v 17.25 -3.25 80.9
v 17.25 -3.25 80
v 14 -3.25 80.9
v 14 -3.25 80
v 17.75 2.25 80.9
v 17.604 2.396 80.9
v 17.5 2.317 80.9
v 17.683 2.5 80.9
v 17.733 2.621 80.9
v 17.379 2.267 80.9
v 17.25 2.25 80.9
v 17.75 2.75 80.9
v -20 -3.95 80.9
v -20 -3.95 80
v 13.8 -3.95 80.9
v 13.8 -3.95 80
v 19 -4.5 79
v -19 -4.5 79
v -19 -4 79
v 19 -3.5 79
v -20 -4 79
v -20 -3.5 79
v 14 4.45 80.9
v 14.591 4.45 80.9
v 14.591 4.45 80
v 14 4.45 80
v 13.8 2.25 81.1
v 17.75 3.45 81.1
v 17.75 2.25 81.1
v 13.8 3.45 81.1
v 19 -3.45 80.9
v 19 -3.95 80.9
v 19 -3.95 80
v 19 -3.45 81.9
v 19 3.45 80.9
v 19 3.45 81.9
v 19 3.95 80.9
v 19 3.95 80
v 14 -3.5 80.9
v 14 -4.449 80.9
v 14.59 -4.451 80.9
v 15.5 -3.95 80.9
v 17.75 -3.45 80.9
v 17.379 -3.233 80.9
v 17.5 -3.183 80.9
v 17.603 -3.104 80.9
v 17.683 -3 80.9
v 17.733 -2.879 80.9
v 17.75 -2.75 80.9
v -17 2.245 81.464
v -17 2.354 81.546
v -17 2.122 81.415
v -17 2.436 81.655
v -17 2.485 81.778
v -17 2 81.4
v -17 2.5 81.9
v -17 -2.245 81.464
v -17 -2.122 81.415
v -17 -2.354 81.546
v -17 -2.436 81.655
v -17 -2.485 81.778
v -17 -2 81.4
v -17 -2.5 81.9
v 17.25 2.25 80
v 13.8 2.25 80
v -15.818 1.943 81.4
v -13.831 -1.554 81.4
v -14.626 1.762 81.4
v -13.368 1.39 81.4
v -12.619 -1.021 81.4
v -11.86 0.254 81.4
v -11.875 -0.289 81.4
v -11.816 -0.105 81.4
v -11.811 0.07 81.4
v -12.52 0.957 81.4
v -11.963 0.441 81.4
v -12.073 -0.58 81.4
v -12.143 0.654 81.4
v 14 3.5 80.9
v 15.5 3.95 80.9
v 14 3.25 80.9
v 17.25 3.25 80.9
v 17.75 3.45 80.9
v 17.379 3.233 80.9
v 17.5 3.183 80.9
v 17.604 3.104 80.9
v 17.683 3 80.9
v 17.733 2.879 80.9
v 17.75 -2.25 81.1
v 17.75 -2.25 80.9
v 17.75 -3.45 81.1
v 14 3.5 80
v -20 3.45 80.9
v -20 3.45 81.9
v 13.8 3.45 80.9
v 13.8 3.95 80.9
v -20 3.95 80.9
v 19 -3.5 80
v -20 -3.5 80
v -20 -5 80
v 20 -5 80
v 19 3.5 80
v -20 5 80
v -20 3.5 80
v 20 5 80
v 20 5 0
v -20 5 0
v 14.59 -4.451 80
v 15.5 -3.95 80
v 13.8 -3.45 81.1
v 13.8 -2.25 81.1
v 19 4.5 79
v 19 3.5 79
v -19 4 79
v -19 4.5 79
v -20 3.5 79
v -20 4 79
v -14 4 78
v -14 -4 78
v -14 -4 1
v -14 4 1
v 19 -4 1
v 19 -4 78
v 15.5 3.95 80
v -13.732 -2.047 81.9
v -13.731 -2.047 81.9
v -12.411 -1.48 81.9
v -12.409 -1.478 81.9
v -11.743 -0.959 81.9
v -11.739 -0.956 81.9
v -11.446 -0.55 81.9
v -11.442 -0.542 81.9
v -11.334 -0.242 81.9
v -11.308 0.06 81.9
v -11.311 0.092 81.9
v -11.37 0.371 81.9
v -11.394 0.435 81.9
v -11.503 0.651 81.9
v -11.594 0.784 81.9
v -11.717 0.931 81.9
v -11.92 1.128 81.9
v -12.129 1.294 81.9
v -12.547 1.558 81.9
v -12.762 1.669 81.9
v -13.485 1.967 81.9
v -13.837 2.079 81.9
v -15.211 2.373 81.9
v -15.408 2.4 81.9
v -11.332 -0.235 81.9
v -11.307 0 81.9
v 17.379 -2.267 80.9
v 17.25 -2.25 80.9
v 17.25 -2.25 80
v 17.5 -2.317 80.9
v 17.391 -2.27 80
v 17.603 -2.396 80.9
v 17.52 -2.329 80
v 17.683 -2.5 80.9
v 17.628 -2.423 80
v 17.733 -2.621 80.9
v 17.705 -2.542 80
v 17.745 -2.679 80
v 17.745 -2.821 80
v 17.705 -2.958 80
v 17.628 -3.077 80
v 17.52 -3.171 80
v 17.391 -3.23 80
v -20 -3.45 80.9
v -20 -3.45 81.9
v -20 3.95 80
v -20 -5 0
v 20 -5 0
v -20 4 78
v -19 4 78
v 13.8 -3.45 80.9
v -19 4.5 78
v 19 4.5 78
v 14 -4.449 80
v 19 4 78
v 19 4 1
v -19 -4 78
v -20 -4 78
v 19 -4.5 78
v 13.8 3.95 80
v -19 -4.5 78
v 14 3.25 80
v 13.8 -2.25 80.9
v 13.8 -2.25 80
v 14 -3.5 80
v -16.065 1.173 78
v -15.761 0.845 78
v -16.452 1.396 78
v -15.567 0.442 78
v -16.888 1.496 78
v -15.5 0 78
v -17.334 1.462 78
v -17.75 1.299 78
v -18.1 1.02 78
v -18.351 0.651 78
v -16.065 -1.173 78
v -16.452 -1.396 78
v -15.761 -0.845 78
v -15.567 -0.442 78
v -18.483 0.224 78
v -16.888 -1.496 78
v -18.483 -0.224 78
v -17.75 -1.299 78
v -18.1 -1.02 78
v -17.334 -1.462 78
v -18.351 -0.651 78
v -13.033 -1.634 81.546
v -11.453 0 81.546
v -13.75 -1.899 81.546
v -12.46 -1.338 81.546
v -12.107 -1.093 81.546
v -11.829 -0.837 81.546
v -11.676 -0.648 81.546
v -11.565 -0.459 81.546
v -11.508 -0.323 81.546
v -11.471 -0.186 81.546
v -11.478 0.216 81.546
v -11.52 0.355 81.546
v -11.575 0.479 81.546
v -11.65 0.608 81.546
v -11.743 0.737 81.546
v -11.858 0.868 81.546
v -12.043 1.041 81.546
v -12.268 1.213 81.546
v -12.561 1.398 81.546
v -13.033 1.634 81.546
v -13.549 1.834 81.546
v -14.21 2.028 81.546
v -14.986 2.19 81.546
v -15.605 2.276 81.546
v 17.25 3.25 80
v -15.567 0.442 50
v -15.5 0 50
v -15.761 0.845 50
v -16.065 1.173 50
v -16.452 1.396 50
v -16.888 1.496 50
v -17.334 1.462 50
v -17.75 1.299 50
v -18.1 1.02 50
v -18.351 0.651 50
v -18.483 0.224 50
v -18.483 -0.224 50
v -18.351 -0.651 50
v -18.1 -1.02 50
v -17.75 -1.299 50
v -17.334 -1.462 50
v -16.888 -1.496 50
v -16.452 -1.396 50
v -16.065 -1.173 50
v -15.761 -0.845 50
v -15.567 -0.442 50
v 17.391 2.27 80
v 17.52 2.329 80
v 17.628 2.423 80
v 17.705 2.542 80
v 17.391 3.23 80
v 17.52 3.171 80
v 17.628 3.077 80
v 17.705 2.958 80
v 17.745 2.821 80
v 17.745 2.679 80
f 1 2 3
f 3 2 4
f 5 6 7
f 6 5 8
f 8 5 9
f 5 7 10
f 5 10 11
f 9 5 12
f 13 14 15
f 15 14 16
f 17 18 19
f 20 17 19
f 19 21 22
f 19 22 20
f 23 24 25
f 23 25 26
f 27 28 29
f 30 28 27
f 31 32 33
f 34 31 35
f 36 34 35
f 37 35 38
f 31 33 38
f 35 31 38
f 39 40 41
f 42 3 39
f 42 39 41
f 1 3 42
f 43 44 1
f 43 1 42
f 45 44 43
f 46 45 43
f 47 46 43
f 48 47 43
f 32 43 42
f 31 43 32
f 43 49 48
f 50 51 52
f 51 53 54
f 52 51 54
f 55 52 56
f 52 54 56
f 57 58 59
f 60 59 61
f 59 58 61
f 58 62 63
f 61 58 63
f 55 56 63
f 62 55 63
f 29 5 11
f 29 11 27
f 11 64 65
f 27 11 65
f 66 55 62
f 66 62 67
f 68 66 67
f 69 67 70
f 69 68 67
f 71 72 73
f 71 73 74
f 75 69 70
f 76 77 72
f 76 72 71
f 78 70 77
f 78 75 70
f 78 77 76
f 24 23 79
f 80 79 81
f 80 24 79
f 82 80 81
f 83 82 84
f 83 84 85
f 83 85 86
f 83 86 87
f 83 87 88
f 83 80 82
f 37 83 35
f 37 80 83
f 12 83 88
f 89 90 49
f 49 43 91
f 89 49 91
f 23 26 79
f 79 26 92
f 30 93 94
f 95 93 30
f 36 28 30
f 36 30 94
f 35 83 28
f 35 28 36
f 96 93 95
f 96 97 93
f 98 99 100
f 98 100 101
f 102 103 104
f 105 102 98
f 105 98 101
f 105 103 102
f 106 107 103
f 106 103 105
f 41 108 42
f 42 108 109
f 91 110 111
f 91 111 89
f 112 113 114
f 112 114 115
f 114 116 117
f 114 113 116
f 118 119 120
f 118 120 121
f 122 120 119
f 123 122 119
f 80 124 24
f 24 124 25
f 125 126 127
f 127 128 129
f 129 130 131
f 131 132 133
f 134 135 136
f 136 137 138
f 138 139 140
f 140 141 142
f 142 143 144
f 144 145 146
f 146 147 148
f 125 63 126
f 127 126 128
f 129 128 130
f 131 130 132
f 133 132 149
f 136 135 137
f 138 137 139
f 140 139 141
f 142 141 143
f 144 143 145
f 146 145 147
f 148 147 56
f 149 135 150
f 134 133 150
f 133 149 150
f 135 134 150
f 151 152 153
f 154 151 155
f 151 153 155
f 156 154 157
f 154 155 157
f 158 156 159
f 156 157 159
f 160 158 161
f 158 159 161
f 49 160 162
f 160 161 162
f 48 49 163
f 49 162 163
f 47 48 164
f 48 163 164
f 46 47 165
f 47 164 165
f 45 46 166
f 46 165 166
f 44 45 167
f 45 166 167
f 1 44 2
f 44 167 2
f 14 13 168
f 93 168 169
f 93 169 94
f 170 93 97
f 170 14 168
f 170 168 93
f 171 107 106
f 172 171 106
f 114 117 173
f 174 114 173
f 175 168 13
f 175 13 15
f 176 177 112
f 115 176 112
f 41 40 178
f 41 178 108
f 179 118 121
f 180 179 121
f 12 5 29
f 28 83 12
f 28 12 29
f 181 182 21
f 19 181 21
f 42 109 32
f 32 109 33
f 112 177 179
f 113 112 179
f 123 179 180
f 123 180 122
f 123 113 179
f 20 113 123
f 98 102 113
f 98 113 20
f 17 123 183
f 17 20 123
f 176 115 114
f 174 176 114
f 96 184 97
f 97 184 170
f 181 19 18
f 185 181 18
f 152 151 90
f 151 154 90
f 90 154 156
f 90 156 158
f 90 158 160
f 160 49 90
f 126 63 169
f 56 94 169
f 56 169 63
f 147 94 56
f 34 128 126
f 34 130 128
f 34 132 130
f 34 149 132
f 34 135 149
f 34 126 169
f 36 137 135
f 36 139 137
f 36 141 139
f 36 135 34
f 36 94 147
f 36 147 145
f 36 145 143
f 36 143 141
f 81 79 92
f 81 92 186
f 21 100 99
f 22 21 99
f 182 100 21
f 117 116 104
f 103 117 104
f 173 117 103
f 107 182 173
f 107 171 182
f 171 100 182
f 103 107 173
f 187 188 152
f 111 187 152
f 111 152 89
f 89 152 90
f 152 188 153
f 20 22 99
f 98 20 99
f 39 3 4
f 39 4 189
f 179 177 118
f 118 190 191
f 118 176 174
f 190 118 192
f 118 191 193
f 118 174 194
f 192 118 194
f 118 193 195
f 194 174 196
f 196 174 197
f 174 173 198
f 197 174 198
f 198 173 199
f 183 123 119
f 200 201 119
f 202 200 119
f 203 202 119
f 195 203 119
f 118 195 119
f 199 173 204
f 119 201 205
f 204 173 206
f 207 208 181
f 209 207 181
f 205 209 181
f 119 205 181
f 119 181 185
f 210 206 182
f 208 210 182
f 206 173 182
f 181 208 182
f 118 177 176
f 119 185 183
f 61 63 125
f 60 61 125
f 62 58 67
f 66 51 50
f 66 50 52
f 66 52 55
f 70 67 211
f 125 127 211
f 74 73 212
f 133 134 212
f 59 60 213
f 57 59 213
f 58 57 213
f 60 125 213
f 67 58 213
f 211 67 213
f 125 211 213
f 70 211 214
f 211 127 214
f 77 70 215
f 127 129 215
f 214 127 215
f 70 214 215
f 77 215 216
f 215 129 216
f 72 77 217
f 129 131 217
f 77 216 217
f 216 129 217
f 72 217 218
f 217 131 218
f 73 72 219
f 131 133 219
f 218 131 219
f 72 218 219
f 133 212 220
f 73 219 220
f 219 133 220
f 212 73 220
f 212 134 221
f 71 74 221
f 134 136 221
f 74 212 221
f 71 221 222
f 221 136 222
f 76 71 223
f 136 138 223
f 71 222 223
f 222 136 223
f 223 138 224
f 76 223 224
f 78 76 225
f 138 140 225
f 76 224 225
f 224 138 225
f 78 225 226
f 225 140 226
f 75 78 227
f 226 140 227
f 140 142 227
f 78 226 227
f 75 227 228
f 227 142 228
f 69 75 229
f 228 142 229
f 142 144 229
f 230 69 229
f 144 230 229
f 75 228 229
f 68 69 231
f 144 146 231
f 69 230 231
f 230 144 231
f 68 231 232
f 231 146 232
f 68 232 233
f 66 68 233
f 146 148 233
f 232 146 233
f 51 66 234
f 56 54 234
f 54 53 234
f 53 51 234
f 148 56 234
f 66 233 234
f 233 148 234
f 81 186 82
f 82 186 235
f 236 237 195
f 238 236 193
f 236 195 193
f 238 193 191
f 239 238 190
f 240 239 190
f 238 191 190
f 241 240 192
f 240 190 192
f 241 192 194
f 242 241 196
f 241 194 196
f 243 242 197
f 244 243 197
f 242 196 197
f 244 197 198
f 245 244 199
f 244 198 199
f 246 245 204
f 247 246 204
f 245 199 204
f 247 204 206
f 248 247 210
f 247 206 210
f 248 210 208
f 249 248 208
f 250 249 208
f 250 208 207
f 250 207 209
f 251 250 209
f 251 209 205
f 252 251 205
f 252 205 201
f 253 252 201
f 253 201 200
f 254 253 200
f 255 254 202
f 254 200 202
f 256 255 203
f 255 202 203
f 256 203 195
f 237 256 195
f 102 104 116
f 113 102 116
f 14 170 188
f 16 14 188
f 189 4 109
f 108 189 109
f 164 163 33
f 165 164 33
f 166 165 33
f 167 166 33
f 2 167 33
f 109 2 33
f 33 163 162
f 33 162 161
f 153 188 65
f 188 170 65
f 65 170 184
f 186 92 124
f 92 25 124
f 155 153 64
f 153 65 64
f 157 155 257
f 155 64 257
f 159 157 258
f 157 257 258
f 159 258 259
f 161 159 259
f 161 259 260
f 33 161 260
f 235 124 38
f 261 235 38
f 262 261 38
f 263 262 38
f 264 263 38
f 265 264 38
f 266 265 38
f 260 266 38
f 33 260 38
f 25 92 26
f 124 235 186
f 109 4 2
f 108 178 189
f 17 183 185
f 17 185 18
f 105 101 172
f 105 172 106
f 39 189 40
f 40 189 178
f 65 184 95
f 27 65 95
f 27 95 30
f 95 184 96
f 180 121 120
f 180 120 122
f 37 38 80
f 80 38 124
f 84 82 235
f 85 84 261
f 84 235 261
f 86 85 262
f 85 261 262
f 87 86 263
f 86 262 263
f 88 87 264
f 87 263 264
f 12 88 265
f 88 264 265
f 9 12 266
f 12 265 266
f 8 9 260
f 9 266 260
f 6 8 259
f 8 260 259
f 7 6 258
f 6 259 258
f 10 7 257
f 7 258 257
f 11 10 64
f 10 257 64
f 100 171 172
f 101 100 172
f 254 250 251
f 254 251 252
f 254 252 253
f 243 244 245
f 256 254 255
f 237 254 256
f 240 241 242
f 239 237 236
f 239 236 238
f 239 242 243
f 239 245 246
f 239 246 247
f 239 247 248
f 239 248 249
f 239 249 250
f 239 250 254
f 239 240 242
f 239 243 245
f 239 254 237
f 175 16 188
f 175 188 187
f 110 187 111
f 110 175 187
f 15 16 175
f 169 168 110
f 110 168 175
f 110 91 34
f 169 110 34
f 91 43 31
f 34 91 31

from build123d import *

# Parameters (mm, degrees)
F0_W      = 40
F0_H      = 10
F1_DEPTH  = 80
F3_START  = -2
F2_W      = 33
F2_H      = 8
F3_DEPTH  = 77
F5_START  = -2
F4_R      = 1.5
F5_DEPTH  = 28
F7_DEPTH  = 39
F9_START  = -1
F8_W      = 0.5
F8_H      = 1
F9_DEPTH  = 38
F11_DEPTH = 0.9
F12_W     = 39
F12_H     = 6.9
F13_DEPTH = 1
F14_W     = 3.9498324515
F14_H     = 0.2
F15_DEPTH = 1.2
F16_W     = 3.95
F16_H     = 0.2
F17_DEPTH = 1.2
F19_DEPTH = 0.5
F20_R     = 0.49999


# Not quite as in the source:
# - a fillet or chamfer is up to 0.001 mm smaller than in the source, because OpenCascade refuses the exact size


with BuildPart() as f1:
    # F0 (on Top) → F1 (new body)
    with BuildSketch(Plane.XY):
        Rectangle(F0_W, F0_H)
    extrude(amount=F1_DEPTH)

    # F2 (on face) → F3 (cut)
    with BuildSketch(Plane.XY.offset(80).offset(F3_START)):
        with Locations((2.5, 0)):
            Rectangle(F2_W, F2_H)
    extrude(amount=-F3_DEPTH, mode=Mode.SUBTRACT)

    # F4 (on face) → F5 (cut)
    with BuildSketch(Plane.XY.offset(80).offset(F5_START)):
        with Locations((-17, 0)):
            Circle(F4_R)
    extrude(amount=-F5_DEPTH, mode=Mode.SUBTRACT)

    # F6 (on face) → F7 (cut)
    with BuildSketch(Plane(origin=(-20, 0, 0), x_dir=(0, -1, 0), z_dir=(-1, 0, 0))):
        Polygon((3.5, 79), (3.5, 80), (-3.5, 80), (-3.5, 79), (-4, 79), (-4, 78), (4, 78), (4, 79), align=None)
    extrude(amount=-F7_DEPTH, mode=Mode.SUBTRACT)

    # F8 (on face) → F9 (cut)
    with BuildSketch(Plane(origin=(-20, 0, 0), x_dir=(0, -1, 0), z_dir=(-1, 0, 0)).offset(F9_START)):
        with Locations((4.25, 78.5)):
            Rectangle(F8_W, F8_H)
        with Locations((-4.25, 78.5)):
            Rectangle(F8_W, F8_H)
    extrude(amount=-F9_DEPTH, mode=Mode.SUBTRACT)


with BuildPart() as f11:
    # F10 (on face) → F11 (new body)
    with BuildSketch(Plane.XY.offset(80)):
        with BuildLine():
            Line((19, -3.95), (19, -3.5))
            Line((19, -3.5), (19, 3.5))
            Line((19, 3.5), (19, 3.95))
            Line((19, 3.95), (15.5, 3.95))
            Line((15.5, 3.95), (14.5909090909, 4.45))
            Line((14.5909090909, 4.45), (14, 4.45))
            Line((14, 4.45), (14, 3.95))
            Line((14, 3.95), (14, 3.5000000002))
            Line((14, 3.5000000002), (13.9999991525, 3.25))
            Line((13.9999991525, 3.25), (17.25, 3.25))
            ThreePointArc((17.25, 3.25), (17.75, 2.75), (17.25, 2.25))
            Line((17.25, 2.25), (13.8, 2.25))
            Line((13.8, 2.25), (13.8, 3.5))
            Line((13.8, 3.5), (13.8, 3.95))
            Line((13.8, 3.95), (-20, 3.95))
            Line((-20, 3.95), (-20, -3.95))
            Line((-20, -3.95), (13.8, -3.95))
            Line((13.8, -3.95), (13.8, -3.5))
            Line((13.8, -3.5), (13.8, -2.25))
            Line((13.8, -2.25), (17.2498324515, -2.25))
            ThreePointArc((17.2498324515, -2.25), (17.7498324515, -2.75), (17.2498324515, -3.25))
            Line((17.2498324515, -3.25), (13.9998308422, -3.25))
            Line((13.9998308422, -3.25), (14, -3.5))
            Line((14, -3.5), (14, -3.95))
            Line((14, -3.95), (14, -4.4487268106))
            Line((14, -4.4487268106), (14.5903386392, -4.4505964817))
            Line((14.5903386392, -4.4505964817), (15.5, -3.95))
            Line((15.5, -3.95), (19, -3.95))
        make_face()
    extrude(amount=F11_DEPTH)

    # F12 (on face) → F13 (join)
    with BuildSketch(Plane.XY.offset(80.9)):
        with Locations((-0.5, 0)):
            Rectangle(F12_W, F12_H)
    extrude(amount=F13_DEPTH)

    # F14 (on face) → F15 (cut)
    with BuildSketch(Plane.XZ.offset(3.45)):
        with Locations((15.7749162257, 81)):
            Rectangle(F14_W, F14_H)
    extrude(amount=-F15_DEPTH, mode=Mode.SUBTRACT)

    # F16 (on face) → F17 (cut)
    with BuildSketch(Plane(origin=(0, 3.45, 0), x_dir=(-1, 0, 0), z_dir=(0, 1, 0))):
        with Locations((-15.775, 81)):
            Rectangle(F16_W, F16_H)
    extrude(amount=-F17_DEPTH, mode=Mode.SUBTRACT)

    # F18 (on face) → F19 (cut)
    with BuildSketch(Plane.XY.offset(81.9)):
        with BuildLine():
            Line((-17, 2.5), (-17, 0))
            Line((-17, 0), (-17, -2.5))
            add(Edge.make_bspline(
                [(-17, -2.5), (-11.3068194012, -2.5), (-11.3068194012, 0), (-11.3068194012, 2.5), (-17, 2.5)],
                knots=[1.5707963268, 1.5707963268, 1.5707963268, 3.1415926536, 3.1415926536, 4.7123889804, 4.7123889804, 4.7123889804], degree=2, weights=[1, 0.7071067812, 1, 0.7071067812, 1]))
        make_face()
    extrude(amount=-F19_DEPTH, mode=Mode.SUBTRACT)

    # F20 (radius 0.5 in the source; OpenCascade refuses exactly that, so slightly less here)
    f20_edges = [f11.edges().sort_by_distance(p)[0] for p in [
        (-11.306819, 0, 81.4),
    ]]
    fillet(f20_edges, radius=F20_R)


solid = Compound([f1.part, f11.part])
